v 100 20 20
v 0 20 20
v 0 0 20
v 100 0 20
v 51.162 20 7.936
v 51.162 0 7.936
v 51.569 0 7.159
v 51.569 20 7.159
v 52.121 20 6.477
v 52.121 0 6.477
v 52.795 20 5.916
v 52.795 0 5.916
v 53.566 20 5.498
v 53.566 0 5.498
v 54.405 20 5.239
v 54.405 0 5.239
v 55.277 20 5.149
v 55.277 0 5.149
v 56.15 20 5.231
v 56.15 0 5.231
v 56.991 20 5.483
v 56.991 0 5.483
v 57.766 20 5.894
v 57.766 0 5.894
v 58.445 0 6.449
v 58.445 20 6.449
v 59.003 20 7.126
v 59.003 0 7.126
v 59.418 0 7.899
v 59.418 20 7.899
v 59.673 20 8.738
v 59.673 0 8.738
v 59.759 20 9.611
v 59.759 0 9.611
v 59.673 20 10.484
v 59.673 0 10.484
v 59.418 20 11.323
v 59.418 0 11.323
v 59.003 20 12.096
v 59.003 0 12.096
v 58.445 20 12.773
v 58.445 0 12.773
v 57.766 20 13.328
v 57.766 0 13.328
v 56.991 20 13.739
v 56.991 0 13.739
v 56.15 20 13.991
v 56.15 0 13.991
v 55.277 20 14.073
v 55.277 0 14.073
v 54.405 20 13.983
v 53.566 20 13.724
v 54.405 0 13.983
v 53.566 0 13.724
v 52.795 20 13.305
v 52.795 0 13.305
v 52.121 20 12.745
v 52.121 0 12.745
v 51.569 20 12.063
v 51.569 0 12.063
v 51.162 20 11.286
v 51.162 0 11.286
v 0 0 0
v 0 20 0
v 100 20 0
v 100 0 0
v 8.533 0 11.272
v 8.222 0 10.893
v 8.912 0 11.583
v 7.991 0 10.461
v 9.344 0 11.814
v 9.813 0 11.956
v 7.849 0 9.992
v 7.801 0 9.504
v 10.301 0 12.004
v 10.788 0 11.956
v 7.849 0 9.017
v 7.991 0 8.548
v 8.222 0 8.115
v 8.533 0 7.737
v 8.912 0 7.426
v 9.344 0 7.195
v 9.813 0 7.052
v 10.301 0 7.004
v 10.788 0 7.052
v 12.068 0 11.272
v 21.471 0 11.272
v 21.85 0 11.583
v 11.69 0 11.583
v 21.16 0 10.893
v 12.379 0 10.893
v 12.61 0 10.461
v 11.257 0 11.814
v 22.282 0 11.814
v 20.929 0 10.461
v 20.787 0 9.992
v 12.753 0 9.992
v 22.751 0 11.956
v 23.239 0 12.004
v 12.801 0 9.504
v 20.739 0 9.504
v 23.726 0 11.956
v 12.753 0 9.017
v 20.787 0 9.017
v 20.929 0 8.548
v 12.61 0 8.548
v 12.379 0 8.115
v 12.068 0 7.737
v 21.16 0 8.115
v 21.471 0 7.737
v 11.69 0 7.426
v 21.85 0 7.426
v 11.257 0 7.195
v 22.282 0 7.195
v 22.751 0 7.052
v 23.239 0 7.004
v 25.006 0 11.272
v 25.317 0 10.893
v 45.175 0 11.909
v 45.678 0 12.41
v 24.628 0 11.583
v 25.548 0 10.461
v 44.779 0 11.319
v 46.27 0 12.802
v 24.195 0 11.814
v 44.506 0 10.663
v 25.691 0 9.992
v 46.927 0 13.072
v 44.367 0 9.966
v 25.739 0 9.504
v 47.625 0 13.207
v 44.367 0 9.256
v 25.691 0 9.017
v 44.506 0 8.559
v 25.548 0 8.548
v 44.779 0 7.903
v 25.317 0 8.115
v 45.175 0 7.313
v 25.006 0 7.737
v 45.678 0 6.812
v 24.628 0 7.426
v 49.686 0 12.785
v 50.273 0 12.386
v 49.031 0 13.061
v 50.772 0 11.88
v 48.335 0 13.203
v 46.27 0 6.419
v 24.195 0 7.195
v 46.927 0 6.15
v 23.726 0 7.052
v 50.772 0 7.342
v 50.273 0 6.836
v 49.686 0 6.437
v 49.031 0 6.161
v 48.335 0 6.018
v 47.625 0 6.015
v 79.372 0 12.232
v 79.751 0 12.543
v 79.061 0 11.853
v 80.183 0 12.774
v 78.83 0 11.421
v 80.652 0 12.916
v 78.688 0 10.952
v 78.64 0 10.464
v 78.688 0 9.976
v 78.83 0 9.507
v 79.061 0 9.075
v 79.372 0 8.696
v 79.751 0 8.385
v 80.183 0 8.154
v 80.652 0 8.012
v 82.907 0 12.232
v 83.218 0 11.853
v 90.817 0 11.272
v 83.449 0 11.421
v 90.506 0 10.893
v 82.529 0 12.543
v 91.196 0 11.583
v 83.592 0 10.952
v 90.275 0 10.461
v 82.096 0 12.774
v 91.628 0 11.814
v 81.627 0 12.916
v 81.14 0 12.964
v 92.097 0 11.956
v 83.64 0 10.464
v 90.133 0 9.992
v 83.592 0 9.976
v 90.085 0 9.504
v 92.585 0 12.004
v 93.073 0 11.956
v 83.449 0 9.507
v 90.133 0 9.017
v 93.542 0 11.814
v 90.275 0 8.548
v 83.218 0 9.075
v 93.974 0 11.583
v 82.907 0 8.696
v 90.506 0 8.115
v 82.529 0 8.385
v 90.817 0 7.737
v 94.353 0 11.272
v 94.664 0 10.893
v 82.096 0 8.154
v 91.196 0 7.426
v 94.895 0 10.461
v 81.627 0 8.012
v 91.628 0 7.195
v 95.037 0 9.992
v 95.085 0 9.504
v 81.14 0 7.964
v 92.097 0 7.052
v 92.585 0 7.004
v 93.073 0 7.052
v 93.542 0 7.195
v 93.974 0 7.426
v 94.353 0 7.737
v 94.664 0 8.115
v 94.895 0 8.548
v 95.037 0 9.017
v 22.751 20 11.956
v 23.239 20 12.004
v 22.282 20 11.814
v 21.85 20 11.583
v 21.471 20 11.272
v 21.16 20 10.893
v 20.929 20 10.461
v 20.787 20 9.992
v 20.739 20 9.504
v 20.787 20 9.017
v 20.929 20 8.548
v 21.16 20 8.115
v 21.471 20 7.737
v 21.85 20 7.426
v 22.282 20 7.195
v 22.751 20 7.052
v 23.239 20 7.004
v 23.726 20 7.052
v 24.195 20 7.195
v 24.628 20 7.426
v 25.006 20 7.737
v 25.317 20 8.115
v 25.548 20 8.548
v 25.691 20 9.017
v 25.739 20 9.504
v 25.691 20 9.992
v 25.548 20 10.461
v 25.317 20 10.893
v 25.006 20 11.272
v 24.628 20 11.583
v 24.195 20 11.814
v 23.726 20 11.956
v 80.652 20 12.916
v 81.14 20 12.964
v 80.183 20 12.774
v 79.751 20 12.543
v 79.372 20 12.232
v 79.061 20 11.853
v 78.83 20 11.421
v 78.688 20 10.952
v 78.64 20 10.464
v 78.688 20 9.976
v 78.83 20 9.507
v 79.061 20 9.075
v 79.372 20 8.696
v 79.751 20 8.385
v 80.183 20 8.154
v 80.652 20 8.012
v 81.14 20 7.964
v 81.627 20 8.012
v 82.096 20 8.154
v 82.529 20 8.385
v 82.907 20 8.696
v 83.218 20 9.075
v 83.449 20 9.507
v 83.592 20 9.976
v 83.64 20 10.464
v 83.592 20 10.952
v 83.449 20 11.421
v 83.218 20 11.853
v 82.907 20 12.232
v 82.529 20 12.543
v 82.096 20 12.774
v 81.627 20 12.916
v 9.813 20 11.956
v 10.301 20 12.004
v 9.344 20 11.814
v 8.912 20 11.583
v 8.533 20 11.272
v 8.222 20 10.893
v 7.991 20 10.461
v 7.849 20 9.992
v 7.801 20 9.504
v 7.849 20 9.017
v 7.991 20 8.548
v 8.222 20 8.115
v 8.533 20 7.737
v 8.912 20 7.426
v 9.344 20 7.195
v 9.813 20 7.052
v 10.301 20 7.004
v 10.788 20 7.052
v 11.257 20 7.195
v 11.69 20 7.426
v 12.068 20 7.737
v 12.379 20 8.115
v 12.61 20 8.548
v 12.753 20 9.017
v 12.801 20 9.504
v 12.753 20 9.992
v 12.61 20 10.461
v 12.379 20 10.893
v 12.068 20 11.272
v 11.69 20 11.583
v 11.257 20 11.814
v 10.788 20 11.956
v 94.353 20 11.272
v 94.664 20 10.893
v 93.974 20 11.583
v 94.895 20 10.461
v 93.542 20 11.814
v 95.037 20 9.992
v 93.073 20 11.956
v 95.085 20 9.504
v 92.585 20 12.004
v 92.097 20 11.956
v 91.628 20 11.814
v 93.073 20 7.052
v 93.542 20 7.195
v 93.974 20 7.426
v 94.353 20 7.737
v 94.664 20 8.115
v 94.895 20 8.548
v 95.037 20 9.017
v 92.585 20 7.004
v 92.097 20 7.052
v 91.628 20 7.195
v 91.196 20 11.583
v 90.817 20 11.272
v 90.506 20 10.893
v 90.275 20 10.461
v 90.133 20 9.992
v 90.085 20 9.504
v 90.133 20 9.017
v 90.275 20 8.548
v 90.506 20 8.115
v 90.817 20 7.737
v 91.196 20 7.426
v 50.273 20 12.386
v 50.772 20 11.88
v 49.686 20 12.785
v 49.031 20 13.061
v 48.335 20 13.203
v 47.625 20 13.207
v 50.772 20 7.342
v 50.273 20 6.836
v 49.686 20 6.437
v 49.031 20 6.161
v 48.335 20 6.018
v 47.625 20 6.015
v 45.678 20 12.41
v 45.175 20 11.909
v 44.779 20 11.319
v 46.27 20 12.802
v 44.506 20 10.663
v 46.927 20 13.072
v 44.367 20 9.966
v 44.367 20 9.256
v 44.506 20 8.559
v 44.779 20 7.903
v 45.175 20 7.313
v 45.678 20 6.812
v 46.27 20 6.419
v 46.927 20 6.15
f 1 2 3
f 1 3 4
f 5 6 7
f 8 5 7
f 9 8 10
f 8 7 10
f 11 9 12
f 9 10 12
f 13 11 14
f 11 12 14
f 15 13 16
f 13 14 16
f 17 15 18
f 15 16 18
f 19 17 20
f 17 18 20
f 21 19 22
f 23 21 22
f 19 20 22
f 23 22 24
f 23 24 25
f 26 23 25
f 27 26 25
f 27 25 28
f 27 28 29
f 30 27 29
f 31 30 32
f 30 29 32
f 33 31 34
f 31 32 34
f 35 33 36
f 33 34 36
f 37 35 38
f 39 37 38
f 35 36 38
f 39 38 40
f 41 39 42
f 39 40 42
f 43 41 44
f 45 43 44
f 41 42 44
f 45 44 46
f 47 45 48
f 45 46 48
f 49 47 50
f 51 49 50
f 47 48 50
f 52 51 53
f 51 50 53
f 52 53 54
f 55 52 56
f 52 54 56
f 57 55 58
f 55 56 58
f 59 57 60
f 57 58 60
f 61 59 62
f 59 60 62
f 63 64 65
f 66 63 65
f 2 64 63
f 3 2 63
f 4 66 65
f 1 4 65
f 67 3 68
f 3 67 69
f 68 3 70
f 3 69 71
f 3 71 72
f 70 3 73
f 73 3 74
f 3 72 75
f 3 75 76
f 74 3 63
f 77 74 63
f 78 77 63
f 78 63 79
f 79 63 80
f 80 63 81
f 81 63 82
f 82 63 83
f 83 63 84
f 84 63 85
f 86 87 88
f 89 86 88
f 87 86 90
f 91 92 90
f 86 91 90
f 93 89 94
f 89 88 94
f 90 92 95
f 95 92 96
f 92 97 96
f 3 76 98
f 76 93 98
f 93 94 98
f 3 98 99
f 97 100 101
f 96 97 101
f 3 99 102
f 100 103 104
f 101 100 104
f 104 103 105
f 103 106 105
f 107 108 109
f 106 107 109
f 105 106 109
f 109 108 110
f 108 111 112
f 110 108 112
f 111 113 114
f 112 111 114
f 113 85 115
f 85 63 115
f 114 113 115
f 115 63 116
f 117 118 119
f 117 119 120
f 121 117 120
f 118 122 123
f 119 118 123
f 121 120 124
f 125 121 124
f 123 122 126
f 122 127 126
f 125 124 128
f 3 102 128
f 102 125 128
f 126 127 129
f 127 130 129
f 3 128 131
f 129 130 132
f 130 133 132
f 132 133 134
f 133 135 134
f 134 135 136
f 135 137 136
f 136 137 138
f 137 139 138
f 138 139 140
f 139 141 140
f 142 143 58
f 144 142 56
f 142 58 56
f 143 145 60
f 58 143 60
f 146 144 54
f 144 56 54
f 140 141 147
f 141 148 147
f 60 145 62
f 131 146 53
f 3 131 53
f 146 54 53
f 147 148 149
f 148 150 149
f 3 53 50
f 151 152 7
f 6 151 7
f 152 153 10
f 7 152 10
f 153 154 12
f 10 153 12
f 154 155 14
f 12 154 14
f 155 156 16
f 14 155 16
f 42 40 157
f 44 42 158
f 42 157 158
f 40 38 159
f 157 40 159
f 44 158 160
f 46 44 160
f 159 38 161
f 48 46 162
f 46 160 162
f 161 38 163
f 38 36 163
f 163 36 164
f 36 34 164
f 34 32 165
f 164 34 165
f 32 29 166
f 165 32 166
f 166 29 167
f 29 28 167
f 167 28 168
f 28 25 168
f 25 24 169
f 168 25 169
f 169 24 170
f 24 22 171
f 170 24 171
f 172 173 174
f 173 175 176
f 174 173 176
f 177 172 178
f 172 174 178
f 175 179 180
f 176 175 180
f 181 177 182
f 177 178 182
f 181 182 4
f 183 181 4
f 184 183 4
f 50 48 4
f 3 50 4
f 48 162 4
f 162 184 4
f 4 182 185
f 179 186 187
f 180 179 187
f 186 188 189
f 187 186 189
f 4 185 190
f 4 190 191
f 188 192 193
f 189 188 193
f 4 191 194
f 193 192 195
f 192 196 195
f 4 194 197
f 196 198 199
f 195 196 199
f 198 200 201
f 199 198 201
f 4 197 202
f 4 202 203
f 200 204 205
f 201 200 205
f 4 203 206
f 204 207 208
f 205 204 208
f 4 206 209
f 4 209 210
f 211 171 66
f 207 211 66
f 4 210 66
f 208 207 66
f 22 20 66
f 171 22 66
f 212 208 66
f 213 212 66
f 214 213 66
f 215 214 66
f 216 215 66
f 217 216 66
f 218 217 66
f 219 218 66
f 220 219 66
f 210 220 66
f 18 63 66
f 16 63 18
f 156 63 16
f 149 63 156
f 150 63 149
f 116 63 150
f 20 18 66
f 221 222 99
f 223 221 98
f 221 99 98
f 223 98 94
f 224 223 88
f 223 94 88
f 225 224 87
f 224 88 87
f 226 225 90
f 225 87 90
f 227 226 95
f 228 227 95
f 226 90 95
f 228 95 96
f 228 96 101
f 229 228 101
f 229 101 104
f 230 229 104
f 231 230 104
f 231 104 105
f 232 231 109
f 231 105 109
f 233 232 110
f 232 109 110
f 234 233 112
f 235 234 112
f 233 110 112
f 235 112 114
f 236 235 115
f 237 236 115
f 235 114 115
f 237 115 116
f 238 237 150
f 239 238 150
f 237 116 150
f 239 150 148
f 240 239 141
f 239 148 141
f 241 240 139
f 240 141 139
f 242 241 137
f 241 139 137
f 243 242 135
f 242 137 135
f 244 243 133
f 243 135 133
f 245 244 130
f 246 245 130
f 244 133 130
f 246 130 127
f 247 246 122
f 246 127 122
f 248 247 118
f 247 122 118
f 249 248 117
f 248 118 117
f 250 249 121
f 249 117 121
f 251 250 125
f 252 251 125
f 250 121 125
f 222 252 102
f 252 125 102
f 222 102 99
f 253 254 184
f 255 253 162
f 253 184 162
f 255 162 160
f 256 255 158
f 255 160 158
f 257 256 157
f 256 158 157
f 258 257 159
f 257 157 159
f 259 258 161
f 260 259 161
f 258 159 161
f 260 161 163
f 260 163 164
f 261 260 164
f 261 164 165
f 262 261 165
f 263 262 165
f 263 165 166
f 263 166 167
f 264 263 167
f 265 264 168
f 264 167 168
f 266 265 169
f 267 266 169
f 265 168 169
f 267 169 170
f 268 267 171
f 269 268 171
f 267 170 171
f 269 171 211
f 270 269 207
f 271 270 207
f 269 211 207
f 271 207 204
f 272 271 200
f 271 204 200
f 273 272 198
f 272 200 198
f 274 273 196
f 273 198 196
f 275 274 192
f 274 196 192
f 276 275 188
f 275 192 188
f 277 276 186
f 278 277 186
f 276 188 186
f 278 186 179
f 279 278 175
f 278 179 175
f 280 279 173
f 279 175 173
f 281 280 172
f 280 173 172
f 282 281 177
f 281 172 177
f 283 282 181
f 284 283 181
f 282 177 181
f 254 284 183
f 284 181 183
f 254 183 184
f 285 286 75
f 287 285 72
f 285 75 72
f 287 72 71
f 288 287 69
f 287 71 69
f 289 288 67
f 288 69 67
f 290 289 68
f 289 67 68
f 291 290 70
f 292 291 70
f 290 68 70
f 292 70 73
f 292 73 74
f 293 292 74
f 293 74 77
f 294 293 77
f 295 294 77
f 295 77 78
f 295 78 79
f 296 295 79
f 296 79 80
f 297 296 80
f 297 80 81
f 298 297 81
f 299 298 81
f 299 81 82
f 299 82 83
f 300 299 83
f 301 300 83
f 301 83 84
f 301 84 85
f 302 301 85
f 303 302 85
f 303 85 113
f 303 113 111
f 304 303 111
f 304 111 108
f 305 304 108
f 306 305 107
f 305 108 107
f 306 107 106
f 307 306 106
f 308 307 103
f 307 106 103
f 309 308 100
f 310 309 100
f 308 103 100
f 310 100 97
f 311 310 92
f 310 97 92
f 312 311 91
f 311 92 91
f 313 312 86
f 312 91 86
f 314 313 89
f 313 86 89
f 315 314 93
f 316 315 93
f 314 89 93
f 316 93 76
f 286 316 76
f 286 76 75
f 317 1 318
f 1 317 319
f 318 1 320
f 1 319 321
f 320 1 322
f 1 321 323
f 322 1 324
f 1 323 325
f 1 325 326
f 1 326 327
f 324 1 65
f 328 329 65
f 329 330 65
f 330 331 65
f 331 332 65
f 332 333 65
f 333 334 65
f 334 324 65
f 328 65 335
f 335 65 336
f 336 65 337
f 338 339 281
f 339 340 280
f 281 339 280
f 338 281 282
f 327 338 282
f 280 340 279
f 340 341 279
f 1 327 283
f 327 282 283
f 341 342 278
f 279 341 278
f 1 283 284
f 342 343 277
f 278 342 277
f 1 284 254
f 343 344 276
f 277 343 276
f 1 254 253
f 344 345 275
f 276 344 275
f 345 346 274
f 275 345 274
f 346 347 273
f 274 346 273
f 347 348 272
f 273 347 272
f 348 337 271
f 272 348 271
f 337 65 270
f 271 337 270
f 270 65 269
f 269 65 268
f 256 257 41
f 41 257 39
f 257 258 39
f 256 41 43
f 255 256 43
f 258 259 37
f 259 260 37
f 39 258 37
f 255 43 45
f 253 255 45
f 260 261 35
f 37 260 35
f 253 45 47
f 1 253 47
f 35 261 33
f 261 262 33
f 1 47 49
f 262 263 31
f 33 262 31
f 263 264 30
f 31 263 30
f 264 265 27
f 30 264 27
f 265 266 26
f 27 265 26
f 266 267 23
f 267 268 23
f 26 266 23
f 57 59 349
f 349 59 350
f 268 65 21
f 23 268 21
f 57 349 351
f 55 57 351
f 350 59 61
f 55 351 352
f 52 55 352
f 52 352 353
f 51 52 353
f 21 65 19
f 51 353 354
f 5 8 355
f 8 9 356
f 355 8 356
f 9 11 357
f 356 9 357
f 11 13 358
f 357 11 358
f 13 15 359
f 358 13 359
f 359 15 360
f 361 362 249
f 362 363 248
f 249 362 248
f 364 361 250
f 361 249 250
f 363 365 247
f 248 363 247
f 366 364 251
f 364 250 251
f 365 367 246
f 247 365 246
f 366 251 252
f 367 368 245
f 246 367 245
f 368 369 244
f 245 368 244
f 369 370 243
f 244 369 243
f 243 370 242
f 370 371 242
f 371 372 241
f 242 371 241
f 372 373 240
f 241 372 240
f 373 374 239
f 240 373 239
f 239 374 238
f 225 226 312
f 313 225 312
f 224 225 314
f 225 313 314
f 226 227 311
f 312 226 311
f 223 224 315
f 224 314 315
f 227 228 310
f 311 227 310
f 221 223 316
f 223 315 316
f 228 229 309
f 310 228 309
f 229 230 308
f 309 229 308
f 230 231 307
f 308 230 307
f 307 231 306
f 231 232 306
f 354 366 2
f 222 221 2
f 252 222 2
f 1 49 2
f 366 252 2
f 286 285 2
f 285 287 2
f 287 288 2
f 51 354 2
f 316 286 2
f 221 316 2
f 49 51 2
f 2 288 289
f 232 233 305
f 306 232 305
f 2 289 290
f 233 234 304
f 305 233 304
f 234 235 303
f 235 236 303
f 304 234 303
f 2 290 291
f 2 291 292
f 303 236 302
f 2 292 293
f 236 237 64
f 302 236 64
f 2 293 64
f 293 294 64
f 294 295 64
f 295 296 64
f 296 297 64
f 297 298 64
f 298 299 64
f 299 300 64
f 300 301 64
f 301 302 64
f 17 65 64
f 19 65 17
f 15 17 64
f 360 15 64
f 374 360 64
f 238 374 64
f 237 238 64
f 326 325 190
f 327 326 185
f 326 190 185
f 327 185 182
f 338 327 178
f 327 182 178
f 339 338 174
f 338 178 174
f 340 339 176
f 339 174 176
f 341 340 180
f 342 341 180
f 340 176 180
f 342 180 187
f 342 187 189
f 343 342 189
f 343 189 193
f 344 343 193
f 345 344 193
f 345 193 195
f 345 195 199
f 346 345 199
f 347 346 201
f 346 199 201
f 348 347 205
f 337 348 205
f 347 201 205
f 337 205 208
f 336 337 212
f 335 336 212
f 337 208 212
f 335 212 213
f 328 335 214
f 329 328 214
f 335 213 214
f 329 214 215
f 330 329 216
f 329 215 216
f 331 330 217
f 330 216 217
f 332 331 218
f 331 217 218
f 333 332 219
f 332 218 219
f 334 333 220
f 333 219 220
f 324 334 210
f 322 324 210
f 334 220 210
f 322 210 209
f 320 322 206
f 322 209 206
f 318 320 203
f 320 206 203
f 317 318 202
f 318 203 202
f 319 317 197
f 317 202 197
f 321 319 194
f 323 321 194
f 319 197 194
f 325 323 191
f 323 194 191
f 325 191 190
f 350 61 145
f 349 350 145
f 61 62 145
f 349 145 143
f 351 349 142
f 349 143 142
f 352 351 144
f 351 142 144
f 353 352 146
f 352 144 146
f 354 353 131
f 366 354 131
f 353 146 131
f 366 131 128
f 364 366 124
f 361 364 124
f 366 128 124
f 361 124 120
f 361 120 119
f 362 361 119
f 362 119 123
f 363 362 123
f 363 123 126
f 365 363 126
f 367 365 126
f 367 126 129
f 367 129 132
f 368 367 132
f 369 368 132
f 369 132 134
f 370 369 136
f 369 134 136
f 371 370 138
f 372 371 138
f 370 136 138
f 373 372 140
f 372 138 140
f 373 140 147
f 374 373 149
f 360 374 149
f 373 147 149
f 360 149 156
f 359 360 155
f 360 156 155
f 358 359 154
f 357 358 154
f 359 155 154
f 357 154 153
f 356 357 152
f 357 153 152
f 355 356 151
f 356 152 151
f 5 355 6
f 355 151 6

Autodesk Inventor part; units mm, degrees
ref_plane "YZ Plane" through (0, 0, 0) normal (1, 0, 0) x (0, 1, 0)
ref_plane "XZ Plane" through (0, 0, 0) normal (0, 1, 0) x (-1, 0, 0)
ref_plane "XY Plane" through (0, 0, 0) normal (0, 0, 1) x (1, 0, 0)
sketch "Sketch1" plane through (0, 0, 0) normal (0, 0, 1) x (1, 0, 0)
  line L0 (0, 0) -> (100, 0)
  line L1 (100, 0) -> (100, 20)
  line L2 (100, 20) -> (0, 20)
  line L3 (0, 20) -> (0, 0)
  dimension "d0" = 100
  dimension "d1" = 20
extrude "Extrusion1" add sketch "Sketch1" along normal blind 20
sketch "Sketch2" plane through (0, 20, 0) normal (0, 1, 0) x (1, 0, 0)
  circle A0 centre (10.3006, -9.5044) radius 3.7411
  circle A1 centre (23.2386, -9.5044) radius 3.8763
  circle A2 centre (92.585, -9.5044) radius 4.8406
  circle A3 centre (81.1397, -10.4639) radius 4.4927
  point P0 (0, 0)
hole "Hole1" at (10.3006, 20, 9.5044) at (23.2386, 20, 9.5044) at (81.1397, 20, 10.4639) at (92.585, 20, 9.5044) direction (0, -1, 0) diameter 5 end through all
sketch "Sketch3" plane through (0, 20, 0) normal (0, 1, 0) x (1, 0, 0)
  point P0 (0, 0)
sketch "Sketch4" plane through (0, 20, 0) normal (0, 1, 0) x (1, 0, 0)
  arc A0 (51.1615, -7.9359) -> (51.1615, -11.2858) centre (47.9614, -9.6108) ccw
  arc A1 (51.1615, -11.2858) -> (51.1615, -7.9359) centre (55.2972, -9.6108) ccw
  point P0 (0, 0)
extrude "Extrusion2" cut sketch "Sketch4" along normal mid plane 100
properties part number "measuring the torque"
